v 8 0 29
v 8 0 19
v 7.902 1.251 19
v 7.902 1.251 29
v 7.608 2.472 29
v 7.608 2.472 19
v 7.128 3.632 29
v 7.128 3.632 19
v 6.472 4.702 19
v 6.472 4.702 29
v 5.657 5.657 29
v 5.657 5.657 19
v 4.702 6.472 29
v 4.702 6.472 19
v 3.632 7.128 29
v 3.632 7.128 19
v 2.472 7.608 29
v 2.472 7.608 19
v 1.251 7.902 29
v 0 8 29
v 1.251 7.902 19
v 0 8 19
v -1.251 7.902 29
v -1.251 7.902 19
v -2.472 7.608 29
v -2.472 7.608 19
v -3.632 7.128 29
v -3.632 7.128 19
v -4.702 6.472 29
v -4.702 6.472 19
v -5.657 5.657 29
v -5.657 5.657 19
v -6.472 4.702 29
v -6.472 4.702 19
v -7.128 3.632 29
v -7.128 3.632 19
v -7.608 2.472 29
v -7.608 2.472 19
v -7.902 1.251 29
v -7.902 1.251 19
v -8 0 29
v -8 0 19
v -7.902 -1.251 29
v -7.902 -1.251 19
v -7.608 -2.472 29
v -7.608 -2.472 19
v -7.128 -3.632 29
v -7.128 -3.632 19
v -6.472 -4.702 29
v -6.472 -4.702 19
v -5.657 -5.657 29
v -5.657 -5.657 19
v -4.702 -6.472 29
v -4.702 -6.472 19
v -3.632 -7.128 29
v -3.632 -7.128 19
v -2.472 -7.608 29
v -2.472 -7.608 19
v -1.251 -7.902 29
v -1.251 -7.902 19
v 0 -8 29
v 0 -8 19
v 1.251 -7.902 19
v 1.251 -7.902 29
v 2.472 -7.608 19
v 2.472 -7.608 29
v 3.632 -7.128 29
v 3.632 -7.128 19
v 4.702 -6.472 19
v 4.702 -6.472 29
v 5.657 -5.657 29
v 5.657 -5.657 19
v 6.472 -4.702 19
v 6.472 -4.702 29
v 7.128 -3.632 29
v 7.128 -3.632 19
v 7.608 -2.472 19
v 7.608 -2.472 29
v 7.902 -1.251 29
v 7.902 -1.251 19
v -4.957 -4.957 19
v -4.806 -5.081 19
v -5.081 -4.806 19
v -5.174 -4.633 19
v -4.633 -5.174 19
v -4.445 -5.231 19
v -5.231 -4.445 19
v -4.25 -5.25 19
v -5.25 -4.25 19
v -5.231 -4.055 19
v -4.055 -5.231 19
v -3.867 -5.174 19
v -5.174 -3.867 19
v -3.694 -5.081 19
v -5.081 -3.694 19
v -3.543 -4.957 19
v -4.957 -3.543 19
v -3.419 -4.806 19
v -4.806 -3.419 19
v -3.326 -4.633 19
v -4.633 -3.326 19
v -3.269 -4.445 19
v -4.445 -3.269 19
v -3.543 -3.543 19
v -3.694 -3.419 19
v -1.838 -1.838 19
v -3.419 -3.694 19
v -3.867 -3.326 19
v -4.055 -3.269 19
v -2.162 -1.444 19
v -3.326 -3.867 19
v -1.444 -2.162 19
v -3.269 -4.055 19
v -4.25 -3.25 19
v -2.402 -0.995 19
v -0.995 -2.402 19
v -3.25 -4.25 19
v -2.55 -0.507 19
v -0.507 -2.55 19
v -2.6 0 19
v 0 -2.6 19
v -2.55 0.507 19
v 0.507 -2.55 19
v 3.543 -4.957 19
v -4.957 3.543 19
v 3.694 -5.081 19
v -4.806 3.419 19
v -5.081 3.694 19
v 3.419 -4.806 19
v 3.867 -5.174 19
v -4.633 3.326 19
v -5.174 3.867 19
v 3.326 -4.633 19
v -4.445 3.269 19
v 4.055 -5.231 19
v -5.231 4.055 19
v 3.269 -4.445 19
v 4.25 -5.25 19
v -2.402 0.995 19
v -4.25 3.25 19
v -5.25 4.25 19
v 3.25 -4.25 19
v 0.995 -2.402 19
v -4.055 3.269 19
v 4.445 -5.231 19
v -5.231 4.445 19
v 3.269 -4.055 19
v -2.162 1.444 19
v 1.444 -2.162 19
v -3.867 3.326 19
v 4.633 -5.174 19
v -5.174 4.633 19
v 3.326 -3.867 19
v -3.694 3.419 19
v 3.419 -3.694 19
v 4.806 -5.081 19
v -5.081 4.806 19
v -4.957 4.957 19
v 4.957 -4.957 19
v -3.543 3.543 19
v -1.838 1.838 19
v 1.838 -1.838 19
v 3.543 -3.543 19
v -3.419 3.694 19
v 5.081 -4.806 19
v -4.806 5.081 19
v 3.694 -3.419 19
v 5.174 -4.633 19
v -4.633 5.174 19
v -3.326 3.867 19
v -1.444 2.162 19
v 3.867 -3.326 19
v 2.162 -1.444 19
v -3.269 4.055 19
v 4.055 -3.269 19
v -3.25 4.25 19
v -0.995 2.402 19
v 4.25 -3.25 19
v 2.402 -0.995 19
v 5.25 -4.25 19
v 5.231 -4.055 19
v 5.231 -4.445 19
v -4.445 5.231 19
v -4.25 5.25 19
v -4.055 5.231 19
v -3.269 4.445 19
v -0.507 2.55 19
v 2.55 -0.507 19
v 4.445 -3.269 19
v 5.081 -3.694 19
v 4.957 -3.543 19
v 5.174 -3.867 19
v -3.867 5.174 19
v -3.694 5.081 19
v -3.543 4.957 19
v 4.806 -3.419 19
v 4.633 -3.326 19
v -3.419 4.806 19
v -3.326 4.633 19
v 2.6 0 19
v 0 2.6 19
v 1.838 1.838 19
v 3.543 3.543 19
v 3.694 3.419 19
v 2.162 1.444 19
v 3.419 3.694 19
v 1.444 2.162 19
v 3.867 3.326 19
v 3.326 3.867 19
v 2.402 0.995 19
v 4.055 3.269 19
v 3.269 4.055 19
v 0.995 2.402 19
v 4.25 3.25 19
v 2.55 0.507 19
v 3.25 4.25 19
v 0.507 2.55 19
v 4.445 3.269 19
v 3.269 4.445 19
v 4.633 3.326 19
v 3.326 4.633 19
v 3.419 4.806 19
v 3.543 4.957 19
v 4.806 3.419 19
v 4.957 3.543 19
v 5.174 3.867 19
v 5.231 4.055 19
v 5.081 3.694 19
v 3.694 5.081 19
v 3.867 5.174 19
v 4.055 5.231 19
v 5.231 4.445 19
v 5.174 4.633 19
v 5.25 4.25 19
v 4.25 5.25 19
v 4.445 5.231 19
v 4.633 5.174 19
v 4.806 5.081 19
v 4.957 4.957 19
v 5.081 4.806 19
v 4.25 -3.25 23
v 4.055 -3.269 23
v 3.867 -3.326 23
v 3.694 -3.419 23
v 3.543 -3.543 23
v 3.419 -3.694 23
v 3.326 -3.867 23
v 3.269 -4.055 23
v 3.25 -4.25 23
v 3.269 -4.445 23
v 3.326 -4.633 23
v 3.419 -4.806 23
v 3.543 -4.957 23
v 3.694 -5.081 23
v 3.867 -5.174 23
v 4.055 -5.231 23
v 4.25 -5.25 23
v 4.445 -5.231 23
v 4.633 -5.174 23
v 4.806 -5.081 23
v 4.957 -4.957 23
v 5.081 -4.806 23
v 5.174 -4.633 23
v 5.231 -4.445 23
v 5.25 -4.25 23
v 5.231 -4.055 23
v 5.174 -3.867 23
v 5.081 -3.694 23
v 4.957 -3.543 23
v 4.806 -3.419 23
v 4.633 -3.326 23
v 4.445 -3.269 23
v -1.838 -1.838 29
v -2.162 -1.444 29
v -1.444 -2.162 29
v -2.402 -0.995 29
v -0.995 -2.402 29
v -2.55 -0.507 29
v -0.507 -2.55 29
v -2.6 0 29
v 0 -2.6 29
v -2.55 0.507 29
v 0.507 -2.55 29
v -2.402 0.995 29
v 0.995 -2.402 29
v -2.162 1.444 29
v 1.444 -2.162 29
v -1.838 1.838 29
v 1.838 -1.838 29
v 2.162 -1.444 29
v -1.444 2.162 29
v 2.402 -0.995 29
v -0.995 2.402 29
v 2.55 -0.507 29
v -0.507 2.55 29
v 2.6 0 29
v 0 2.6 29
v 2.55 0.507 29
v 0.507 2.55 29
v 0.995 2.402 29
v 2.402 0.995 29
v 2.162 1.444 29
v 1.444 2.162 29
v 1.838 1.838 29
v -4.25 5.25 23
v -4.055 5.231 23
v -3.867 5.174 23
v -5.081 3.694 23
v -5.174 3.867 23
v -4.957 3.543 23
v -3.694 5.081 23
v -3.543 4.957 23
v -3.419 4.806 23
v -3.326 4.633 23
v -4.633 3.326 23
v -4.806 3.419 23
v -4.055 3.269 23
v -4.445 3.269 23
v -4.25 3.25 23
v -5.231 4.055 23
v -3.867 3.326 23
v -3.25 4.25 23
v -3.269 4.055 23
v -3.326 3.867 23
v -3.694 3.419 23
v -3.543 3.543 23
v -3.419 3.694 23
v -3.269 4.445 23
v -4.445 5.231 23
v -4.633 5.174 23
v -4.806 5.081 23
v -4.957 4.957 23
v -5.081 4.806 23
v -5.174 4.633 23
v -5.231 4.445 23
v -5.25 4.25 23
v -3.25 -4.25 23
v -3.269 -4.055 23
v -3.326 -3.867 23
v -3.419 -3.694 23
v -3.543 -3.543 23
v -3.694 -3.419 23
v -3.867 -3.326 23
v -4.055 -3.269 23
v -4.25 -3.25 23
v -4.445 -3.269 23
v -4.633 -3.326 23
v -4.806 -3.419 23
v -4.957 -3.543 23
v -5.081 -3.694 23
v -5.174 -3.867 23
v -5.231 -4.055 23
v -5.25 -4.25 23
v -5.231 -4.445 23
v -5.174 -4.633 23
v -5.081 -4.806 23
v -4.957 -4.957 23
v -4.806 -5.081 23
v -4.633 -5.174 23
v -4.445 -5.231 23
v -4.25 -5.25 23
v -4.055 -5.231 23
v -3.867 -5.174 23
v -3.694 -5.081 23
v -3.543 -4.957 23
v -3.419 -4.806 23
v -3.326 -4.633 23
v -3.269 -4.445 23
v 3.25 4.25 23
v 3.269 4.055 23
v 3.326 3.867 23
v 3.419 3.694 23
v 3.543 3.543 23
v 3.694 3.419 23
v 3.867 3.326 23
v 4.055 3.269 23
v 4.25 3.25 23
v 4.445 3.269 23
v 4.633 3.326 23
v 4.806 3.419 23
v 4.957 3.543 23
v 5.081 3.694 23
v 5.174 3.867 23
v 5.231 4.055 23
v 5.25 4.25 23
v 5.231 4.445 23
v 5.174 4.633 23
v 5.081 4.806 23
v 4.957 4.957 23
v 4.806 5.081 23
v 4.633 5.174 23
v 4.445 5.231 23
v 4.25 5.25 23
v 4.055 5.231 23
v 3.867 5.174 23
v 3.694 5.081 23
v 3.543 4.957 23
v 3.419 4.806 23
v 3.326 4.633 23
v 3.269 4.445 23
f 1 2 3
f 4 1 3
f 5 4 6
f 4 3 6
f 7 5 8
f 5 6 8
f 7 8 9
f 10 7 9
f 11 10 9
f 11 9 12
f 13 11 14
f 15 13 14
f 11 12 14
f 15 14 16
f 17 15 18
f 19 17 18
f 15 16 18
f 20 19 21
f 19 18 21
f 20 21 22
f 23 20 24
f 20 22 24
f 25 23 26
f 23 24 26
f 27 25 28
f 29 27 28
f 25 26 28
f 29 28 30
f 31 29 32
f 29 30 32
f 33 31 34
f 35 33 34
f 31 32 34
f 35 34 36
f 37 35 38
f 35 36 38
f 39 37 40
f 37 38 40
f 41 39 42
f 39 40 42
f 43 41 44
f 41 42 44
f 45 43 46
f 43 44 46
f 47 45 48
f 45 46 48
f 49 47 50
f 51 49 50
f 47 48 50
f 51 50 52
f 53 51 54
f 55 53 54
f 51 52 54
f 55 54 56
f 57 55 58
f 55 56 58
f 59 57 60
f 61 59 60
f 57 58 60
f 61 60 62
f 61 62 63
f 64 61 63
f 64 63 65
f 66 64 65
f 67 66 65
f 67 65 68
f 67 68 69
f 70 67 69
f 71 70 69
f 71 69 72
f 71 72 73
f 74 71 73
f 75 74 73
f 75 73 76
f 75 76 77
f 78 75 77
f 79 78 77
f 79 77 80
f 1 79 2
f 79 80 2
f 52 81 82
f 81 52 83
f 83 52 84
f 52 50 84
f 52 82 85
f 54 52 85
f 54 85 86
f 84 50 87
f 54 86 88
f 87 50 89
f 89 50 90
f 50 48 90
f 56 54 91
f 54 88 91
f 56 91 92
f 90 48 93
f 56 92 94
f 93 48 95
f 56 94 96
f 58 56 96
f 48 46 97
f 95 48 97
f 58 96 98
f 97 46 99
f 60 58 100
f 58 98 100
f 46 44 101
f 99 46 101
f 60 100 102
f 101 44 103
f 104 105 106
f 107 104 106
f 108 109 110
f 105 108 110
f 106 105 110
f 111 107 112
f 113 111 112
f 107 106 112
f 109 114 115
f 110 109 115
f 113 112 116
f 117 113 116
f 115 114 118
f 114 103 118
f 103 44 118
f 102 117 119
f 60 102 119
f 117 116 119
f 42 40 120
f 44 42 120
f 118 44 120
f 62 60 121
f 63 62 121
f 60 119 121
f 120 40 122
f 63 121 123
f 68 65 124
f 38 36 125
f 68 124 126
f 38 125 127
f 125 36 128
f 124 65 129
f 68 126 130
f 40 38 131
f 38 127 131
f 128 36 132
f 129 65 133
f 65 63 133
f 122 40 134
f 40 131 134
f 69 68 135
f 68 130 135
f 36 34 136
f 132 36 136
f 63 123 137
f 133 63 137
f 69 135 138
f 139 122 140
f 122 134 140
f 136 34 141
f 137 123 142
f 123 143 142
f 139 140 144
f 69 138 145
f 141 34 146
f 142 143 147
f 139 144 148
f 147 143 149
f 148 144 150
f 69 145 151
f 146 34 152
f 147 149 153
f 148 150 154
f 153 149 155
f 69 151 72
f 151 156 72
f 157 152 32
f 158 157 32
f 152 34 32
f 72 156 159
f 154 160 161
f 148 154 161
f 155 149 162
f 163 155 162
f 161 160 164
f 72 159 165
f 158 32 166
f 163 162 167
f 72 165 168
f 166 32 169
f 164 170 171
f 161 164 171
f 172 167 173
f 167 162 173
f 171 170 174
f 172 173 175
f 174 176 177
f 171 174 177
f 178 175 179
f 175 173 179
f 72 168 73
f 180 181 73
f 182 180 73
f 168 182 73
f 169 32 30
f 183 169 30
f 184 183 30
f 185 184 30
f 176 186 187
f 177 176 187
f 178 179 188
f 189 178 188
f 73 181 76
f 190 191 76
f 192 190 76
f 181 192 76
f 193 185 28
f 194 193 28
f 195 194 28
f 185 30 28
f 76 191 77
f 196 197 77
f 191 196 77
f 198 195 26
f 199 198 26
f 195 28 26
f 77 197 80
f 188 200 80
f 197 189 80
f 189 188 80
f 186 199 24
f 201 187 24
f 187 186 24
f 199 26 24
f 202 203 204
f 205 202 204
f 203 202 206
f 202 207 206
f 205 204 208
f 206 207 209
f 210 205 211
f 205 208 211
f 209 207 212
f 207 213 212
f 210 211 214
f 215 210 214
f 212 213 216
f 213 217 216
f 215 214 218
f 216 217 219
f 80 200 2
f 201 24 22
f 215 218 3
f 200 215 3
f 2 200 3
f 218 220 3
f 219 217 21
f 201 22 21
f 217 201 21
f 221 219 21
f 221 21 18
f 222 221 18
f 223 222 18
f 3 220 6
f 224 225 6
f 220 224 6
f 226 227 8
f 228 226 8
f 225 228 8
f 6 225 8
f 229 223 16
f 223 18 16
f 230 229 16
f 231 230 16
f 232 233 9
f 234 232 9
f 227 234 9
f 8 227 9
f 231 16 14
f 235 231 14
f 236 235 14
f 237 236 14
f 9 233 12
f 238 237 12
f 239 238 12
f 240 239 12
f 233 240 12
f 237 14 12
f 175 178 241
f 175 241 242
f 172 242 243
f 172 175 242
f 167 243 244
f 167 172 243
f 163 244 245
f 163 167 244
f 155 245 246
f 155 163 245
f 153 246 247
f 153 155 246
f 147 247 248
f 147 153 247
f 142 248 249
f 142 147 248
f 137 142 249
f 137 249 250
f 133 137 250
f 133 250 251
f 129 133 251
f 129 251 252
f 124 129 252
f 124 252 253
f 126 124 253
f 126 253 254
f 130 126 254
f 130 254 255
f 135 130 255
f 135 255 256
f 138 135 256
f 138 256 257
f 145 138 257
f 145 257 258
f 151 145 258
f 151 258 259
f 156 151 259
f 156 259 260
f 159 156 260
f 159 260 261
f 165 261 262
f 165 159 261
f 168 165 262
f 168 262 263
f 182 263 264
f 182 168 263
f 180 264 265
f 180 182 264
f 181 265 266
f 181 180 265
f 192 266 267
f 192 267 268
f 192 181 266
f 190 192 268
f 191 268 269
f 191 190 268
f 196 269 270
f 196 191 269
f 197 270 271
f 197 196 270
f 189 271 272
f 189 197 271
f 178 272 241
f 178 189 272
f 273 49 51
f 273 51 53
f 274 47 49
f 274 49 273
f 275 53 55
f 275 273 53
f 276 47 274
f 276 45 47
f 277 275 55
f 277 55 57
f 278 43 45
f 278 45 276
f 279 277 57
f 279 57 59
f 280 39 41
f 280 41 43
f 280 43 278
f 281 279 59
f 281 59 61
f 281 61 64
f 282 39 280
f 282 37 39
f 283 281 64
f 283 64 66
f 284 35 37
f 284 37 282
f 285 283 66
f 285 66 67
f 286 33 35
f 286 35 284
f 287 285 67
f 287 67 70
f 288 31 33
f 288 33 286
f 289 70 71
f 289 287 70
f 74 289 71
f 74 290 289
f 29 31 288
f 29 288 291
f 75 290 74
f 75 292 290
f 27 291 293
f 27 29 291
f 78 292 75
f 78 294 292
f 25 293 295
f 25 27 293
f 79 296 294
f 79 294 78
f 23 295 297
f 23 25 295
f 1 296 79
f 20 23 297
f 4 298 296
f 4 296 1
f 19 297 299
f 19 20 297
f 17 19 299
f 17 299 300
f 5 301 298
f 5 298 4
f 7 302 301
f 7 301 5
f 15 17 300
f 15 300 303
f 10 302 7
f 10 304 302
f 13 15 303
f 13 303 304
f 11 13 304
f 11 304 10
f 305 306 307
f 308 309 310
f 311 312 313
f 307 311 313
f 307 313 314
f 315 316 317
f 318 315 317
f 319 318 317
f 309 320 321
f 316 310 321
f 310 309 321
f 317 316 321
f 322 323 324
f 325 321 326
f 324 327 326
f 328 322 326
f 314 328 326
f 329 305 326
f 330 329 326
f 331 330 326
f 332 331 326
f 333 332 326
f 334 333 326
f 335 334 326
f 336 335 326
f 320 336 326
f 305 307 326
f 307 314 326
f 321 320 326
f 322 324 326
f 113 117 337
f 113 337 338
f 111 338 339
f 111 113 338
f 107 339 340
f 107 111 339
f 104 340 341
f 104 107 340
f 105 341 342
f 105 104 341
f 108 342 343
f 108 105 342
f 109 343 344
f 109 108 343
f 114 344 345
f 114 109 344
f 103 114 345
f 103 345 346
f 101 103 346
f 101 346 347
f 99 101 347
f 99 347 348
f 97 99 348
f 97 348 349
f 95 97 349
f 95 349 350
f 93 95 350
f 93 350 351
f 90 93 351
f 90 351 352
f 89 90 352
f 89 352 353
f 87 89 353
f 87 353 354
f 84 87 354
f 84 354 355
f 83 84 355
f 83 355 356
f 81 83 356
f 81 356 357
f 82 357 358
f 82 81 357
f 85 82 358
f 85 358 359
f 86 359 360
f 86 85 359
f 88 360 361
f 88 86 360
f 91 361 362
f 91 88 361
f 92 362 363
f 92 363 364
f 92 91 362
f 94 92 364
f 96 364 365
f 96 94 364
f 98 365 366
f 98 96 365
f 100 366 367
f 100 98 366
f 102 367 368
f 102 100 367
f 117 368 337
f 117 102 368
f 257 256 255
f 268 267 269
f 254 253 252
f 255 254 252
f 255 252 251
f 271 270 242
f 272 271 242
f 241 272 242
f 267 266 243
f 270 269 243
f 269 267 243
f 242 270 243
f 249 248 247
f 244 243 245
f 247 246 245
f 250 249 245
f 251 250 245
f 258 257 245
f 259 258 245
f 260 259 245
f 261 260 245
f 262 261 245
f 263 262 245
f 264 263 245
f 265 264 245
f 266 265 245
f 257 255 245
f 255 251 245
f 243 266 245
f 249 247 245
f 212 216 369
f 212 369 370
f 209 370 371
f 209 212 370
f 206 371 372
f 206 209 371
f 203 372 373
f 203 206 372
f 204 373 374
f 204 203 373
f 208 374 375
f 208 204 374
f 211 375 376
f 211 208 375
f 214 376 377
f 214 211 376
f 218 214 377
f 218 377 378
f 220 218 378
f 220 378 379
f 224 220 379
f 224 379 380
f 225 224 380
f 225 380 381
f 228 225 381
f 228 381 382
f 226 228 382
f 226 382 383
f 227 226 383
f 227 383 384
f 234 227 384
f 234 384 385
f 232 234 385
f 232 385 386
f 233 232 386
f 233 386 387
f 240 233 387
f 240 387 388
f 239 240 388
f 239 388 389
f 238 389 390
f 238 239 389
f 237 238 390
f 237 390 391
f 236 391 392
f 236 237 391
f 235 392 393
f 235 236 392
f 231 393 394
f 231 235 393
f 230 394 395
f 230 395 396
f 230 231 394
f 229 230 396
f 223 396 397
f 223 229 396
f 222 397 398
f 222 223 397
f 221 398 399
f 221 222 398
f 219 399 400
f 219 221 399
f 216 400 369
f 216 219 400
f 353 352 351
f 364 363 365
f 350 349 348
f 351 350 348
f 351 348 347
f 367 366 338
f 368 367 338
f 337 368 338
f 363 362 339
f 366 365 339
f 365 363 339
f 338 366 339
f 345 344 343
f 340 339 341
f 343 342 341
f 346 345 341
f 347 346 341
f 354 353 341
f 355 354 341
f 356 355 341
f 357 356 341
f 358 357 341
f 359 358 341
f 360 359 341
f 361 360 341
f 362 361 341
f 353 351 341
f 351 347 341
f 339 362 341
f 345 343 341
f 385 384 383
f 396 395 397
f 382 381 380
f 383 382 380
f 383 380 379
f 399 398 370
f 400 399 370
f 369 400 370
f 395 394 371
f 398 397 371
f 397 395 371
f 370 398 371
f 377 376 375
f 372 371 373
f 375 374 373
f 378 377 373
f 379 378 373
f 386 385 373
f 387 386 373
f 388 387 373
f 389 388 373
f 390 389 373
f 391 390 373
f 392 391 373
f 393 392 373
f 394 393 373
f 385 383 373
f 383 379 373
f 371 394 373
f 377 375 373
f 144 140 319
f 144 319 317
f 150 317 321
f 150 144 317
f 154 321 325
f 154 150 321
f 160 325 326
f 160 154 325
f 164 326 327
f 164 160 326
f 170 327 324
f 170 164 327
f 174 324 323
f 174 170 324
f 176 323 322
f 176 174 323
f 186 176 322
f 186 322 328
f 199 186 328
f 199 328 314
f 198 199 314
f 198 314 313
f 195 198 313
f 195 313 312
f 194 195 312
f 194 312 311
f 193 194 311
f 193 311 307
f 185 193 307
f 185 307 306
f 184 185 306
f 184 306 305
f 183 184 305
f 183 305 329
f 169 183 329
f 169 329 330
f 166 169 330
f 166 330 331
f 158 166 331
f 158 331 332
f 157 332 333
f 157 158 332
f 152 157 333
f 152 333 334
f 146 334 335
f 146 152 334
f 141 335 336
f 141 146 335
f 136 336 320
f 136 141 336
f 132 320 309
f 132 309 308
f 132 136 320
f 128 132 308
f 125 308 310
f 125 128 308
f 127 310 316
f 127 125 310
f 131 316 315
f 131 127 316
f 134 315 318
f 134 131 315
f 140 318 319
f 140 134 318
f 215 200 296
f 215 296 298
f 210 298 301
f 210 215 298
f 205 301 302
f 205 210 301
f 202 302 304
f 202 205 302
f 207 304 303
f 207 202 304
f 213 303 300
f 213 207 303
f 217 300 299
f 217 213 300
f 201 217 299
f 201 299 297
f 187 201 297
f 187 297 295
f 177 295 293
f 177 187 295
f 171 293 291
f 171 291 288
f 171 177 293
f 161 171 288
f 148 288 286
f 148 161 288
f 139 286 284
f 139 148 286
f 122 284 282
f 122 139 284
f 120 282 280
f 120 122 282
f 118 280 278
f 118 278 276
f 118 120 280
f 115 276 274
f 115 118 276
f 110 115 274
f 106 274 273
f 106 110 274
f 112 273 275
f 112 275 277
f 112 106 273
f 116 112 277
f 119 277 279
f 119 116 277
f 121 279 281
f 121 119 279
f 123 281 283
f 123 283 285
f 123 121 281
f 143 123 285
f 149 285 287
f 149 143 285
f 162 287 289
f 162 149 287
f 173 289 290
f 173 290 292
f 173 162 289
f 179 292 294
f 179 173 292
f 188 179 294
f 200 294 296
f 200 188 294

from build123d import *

# Parameters (mm, degrees)
CYLINDER985_R     = 1
CYLINDER985_DEPTH = 20
CYLINDER982_R     = 1
CYLINDER982_DEPTH = 20
CYLINDER983_R     = 1
CYLINDER983_DEPTH = 20
CYLINDER984_R     = 1
CYLINDER984_DEPTH = 20
TUBE080_R         = 8
TUBE080_R_2       = 2.6
TUBE080_DEPTH     = 10


with BuildPart() as v_lec985:
    # Cylinder985 → Cylinder985 (new body)
    with BuildSketch(Plane(origin=(4.25, -4.25, -88), x_dir=(0, 1, 0), z_dir=(0, 0, 1))):
        Circle(CYLINDER985_R)
    extrude(amount=CYLINDER985_DEPTH)


with BuildPart() as v_lec982:
    # Cylinder982 → Cylinder982 (new body)
    with BuildSketch(Plane(origin=(4.25, 4.25, -88), x_dir=(-1, 0, 0), z_dir=(0, 0, 1))):
        Circle(CYLINDER982_R)
    extrude(amount=CYLINDER982_DEPTH)


with BuildPart() as v_lec983:
    # Cylinder983 → Cylinder983 (new body)
    with BuildSketch(Plane(origin=(-4.25, 4.25, -88), x_dir=(0, -1, 0), z_dir=(0, 0, 1))):
        Circle(CYLINDER983_R)
    extrude(amount=CYLINDER983_DEPTH)


with BuildPart() as compound810:
    # Cylinder984 → Cylinder984 (new body)
    with BuildSketch(Plane(origin=(-4.25, -4.25, -88), x_dir=(1, 0, 0), z_dir=(0, 0, 1))):
        Circle(CYLINDER984_R)
    extrude(amount=CYLINDER984_DEPTH)

    # Compound810: union Válec985, Válec982, Válec983
    add(v_lec985.part)
    add(v_lec982.part)
    add(v_lec983.part)


with BuildPart() as compound810_1:
    # Compound810 placement: moved
    add(compound810.part.moved(Location((0, 0, 91))))


with BuildPart() as cut091:
    # Tube080 → Tube080 (new body)
    with BuildSketch(Plane.XY.offset(19)):
        Circle(TUBE080_R)
        Circle(TUBE080_R_2, mode=Mode.SUBTRACT)
    extrude(amount=TUBE080_DEPTH)

    # Cut091: cut Compound810
    add(compound810_1.part, mode=Mode.SUBTRACT)


solid = cut091.part
